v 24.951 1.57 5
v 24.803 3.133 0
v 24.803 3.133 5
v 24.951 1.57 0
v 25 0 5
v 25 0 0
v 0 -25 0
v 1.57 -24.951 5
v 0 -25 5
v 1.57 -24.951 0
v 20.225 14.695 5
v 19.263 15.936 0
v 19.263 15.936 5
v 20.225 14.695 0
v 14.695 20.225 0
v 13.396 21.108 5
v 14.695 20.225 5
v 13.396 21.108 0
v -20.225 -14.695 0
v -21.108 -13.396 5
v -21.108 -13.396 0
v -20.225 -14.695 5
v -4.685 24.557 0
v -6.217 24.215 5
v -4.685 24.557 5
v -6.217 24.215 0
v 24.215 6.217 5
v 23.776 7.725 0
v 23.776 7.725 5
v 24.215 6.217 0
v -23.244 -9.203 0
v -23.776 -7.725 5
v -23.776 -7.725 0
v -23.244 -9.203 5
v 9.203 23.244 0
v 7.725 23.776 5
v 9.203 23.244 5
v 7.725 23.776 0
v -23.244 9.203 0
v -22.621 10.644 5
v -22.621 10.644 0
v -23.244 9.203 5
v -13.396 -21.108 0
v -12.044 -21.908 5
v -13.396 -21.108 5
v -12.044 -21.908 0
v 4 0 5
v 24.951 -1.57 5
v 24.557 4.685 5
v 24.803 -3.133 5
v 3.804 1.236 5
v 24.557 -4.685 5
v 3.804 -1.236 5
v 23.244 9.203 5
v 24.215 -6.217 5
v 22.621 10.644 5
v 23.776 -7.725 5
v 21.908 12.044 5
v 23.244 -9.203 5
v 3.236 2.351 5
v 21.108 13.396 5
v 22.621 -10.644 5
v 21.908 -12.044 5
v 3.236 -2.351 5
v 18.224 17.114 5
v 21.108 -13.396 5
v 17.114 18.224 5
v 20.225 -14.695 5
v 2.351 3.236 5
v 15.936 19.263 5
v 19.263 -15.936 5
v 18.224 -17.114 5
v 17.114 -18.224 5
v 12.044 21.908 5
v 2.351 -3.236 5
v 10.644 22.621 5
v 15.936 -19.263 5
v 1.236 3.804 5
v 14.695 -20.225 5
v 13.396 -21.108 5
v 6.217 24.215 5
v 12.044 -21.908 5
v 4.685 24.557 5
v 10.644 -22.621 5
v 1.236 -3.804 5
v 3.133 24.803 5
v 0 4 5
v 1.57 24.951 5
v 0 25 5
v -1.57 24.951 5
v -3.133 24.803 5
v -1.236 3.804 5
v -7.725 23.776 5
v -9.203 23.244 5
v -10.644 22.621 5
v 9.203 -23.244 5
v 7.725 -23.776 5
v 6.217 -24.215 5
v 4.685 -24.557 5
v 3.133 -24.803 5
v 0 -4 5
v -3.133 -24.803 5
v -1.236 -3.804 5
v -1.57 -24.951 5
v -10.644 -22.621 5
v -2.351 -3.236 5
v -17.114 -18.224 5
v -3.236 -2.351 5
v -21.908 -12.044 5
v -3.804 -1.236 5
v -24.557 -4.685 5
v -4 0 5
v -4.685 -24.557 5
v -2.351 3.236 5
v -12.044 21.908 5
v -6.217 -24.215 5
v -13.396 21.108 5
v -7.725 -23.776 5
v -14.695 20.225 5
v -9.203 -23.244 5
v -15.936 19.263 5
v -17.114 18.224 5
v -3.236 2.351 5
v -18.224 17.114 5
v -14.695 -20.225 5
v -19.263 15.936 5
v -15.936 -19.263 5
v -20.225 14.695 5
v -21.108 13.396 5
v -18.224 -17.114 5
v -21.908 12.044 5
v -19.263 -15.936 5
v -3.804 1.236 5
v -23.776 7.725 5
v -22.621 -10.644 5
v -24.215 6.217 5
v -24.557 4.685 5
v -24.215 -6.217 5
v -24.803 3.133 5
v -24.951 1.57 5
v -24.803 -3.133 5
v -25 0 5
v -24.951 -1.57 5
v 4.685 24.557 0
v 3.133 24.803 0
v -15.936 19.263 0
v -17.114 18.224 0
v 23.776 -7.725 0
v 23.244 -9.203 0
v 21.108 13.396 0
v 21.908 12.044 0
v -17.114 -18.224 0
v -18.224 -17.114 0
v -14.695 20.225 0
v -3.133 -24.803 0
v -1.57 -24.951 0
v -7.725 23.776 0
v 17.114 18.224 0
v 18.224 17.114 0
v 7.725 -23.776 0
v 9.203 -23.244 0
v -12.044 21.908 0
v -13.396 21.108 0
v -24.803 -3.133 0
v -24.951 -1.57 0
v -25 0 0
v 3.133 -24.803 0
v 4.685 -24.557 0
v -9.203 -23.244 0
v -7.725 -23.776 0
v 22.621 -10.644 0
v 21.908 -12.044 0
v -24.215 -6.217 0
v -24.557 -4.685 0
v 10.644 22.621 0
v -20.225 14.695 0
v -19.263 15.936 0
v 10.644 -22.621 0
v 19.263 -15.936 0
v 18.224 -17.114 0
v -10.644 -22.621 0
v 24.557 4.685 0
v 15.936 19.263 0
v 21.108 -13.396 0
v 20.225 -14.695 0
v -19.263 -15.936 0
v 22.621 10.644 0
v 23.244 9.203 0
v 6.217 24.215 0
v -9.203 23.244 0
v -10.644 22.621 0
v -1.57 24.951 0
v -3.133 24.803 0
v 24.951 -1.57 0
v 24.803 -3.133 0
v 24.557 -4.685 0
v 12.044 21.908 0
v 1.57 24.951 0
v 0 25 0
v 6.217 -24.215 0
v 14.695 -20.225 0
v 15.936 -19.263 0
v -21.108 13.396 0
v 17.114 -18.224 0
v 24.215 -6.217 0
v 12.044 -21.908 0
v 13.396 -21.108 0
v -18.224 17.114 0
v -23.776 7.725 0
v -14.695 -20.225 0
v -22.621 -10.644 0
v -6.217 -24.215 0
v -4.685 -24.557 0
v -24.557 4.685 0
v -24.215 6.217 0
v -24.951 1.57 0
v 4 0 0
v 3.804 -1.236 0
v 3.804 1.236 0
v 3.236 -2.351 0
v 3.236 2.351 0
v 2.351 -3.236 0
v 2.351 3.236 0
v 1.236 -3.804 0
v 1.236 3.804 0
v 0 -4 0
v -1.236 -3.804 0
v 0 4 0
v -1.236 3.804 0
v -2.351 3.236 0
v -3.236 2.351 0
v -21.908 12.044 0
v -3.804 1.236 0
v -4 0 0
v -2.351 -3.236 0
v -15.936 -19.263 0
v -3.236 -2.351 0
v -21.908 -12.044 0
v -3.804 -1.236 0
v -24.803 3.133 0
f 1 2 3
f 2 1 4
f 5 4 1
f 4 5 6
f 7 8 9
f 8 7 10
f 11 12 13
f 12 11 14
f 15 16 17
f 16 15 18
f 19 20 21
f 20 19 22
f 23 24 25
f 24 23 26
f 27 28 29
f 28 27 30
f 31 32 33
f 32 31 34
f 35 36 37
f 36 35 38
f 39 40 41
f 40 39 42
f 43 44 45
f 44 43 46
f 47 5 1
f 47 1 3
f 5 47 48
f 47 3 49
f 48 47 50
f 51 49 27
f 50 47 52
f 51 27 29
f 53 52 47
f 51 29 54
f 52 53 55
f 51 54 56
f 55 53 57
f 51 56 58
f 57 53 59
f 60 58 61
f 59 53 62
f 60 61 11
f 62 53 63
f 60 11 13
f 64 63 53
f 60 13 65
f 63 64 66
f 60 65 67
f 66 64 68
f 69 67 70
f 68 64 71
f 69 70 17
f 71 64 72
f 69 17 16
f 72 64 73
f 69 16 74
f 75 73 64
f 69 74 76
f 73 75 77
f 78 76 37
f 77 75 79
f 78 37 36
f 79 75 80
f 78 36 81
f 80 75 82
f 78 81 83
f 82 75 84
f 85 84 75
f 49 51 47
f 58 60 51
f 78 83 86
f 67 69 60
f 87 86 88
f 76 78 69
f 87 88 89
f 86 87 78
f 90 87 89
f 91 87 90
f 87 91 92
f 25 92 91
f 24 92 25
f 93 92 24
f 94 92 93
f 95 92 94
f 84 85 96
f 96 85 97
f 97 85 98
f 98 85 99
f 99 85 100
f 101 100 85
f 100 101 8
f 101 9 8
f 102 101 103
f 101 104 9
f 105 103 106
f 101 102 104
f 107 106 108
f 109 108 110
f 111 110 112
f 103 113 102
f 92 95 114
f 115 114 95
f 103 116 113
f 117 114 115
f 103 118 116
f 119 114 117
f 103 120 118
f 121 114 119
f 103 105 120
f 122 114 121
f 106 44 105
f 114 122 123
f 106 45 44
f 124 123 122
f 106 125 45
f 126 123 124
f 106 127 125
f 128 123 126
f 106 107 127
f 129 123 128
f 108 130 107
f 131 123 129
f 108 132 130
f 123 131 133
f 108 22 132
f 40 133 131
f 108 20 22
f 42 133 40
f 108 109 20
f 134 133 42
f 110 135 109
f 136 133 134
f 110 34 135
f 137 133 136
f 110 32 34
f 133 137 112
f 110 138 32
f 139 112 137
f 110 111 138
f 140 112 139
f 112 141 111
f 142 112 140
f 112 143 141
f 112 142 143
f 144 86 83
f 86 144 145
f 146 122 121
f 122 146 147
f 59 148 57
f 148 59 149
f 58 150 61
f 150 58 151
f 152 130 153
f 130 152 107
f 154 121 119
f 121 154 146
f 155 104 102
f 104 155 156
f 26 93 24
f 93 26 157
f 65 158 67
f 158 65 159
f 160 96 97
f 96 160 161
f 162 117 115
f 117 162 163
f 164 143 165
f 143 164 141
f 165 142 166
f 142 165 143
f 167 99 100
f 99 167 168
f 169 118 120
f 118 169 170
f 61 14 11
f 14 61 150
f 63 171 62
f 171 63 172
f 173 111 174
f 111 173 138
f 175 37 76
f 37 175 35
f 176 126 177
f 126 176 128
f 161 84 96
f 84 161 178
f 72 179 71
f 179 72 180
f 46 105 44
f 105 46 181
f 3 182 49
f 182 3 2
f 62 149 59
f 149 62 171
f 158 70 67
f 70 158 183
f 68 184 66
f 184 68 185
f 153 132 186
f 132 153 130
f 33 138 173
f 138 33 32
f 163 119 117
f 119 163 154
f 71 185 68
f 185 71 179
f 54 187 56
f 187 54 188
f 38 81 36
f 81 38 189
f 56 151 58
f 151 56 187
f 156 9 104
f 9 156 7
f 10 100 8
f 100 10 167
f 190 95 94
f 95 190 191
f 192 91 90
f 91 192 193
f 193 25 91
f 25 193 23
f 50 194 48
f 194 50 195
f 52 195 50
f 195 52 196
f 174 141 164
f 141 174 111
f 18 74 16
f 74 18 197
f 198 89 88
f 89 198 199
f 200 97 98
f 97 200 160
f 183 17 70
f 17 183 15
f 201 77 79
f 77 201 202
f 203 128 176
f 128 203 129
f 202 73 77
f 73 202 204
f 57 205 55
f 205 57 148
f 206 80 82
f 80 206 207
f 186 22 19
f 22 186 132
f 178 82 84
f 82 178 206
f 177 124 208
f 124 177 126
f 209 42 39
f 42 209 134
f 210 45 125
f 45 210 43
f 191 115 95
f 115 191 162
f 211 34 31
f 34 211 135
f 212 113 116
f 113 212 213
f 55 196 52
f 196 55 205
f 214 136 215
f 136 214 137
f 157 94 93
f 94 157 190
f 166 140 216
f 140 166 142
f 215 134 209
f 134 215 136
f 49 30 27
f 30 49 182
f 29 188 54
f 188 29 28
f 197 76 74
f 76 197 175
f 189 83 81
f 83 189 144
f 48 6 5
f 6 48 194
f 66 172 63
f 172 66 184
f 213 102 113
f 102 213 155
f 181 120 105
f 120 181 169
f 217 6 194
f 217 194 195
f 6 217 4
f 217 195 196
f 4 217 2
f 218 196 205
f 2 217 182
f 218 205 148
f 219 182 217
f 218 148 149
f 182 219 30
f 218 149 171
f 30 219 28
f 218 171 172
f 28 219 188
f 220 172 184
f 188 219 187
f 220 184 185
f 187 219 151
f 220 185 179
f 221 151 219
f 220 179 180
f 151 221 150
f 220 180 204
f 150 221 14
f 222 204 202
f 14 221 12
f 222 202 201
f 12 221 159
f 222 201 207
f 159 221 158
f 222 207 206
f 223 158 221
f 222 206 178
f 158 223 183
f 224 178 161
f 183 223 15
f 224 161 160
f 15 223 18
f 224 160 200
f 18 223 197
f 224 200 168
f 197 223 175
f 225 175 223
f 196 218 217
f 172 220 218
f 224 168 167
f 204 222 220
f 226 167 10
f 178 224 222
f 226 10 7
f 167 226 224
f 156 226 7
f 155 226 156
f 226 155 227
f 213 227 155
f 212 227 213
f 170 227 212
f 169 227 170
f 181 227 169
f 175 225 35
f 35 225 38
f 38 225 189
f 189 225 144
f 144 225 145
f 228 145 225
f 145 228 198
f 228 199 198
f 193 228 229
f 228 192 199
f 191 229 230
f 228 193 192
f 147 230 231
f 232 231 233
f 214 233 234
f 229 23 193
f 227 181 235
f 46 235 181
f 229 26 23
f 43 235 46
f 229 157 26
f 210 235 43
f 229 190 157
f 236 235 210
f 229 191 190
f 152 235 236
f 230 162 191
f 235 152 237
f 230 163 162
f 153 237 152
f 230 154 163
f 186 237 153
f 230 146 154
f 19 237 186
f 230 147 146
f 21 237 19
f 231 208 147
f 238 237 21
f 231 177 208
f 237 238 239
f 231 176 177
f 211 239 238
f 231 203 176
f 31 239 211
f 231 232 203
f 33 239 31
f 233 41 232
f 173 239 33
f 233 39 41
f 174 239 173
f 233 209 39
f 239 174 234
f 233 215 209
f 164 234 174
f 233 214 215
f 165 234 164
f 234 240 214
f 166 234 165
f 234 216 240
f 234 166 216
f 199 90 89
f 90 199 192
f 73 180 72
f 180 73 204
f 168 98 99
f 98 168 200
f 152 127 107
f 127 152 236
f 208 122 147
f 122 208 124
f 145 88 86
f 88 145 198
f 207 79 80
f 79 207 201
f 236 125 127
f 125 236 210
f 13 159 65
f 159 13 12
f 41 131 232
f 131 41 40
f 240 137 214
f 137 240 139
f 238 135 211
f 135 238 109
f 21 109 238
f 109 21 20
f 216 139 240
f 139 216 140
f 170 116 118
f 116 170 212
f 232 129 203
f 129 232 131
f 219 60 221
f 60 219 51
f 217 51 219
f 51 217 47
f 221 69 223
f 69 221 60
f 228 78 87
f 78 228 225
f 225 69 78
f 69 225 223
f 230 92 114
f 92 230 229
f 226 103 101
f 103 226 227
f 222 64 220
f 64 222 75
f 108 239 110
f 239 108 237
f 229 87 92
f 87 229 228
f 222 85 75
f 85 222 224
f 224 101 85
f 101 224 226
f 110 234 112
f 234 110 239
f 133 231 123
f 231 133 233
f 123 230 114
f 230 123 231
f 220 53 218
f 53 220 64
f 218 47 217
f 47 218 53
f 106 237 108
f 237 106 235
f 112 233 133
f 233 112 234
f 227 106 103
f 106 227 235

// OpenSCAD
// file: utils/build_plate.scad
// Build Plate representation module
// Made by Makerbot (http://curriculum.makerbot.com/daily_lessons/february/openscad_buildplate.html)

//use this to include a build plate visualization in your openSCAD scripts. Very useful for things designed to be edited in Makerbot Customizer

//to use, either include or use <utils/build_plate.scad>

//then just call build_plate(); with the following arguments (also, you have to have a real object in your scene for this to render)

//putting 0 as the first argument will give you a Replicator 2 build plate
//putting 1 as the first argument will give you a Replicator 1 build plate
//putting 2 as the first argument will give you a Thingomatic build plate
//putting 3 as the first argument will give you a manually adjustable build plate (note: if you use this option, you need to specify your build plates X length (in mm) as the second argument and the Y length (in mm) as the third argument. eg. build_plate(3,150,120);)

/*

to give your user control of which build plate they see in Customizer, include the following code:

use <utils/build_plate.scad>

//for display only, doesn't contribute to final object
build_plate_selector = 0; //[0:Replicator 2,1: Replicator,2:Thingomatic,3:Manual]
//when Build Plate Selector is set to "manual" this controls the build plate x dimension
build_plate_manual_x = 100; //[100:400]
//when Build Plate Selector is set to "manual" this controls the build plate y dimension
build_plate_manual_y = 100; //[100:400]

build_plate(build_plate_selector,build_plate_manual_x,build_plate_manual_y);

*/




//to see how this works, uncomment the following code

//build_plate_selector = 0; //[0:Replicator 2,1: Replicator,2:Thingomatic,3:Manual]
//build_plate_manual_x = 100; //[100:400]
//build_plate_manual_y = 100; //[100:400]
//
//build_plate(build_plate_selector,build_plate_manual_x,build_plate_manual_y);
//
//cube(5);


module build_plate(bp,manX,manY){

		translate([0,0,-.52]){
			if(bp == 0){
				%cube([285,153,1],center = true);
			}
			if(bp == 1){
				%cube([225,145,1],center = true);
			}
			if(bp == 2){
				%cube([120,120,1],center = true);
			}
			if(bp == 3){
				%cube([manX,manY,1],center = true);
			}
		
		}
		translate([0,0,-.5]){
			if(bp == 0){
				for(i = [-14:14]){
					translate([i*10,0,0])
					%cube([.5,153,1.01],center = true);
				}
				for(i = [-7:7]){
					translate([0,i*10,0])
					%cube([285,.5,1.01],center = true);
				}	
			}
			if(bp == 1){
				for(i = [-11:11]){
					translate([i*10,0,0])
						%cube([.5,145,1.01],center = true);
				}
				for(i = [-7:7]){
					translate([0,i*10,0])
						%cube([225,.5,1.01],center = true);
				}
			}
			if(bp == 2){
				for(i = [-6:6]){
					translate([i*10,0,0])
						%cube([.5,120,1.01],center = true);
				}
				for(i = [-6:6]){
					translate([0,i*10,0])
						%cube([120,.5,1.01],center = true);
				}
			}
			if(bp == 3){
				for(i = [-(floor(manX/20)):floor(manX/20)]){
					translate([i*10,0,0])
						%cube([.5,manY,1.01],center = true);
				}
				for(i = [-(floor(manY/20)):floor(manY/20)]){
					translate([0,i*10,0])
						%cube([manX,.5,1.01],center = true);
				}
			}
		}
}
// main file
use <./utils/build_plate.scad> // Cuadricula transparente para la base
build_plate(3, 200,100); // No se incluye al renderizar


//----------------------------------------------------------
//-- Tutorial OpenScad
//-- Juan Gonzalez-Gomez (Obijuan) juan@iearobotics.com
//----------------------------------------------------------
//-- (c) Mayo, 2012
//-- Licencia GPL
//----------------------------------------------------------
//-- Ejemplo de cómo hacer taladros
//----------------------------------------------------------

//-- Rueda simple
difference() {
  //-- Base de la rueda
  cylinder(r=50/2, h=5,$fn=100);

  //-- Taladro de 8mm
  cylinder(r=8/2, h=20,$fn=20,center=true);
}
